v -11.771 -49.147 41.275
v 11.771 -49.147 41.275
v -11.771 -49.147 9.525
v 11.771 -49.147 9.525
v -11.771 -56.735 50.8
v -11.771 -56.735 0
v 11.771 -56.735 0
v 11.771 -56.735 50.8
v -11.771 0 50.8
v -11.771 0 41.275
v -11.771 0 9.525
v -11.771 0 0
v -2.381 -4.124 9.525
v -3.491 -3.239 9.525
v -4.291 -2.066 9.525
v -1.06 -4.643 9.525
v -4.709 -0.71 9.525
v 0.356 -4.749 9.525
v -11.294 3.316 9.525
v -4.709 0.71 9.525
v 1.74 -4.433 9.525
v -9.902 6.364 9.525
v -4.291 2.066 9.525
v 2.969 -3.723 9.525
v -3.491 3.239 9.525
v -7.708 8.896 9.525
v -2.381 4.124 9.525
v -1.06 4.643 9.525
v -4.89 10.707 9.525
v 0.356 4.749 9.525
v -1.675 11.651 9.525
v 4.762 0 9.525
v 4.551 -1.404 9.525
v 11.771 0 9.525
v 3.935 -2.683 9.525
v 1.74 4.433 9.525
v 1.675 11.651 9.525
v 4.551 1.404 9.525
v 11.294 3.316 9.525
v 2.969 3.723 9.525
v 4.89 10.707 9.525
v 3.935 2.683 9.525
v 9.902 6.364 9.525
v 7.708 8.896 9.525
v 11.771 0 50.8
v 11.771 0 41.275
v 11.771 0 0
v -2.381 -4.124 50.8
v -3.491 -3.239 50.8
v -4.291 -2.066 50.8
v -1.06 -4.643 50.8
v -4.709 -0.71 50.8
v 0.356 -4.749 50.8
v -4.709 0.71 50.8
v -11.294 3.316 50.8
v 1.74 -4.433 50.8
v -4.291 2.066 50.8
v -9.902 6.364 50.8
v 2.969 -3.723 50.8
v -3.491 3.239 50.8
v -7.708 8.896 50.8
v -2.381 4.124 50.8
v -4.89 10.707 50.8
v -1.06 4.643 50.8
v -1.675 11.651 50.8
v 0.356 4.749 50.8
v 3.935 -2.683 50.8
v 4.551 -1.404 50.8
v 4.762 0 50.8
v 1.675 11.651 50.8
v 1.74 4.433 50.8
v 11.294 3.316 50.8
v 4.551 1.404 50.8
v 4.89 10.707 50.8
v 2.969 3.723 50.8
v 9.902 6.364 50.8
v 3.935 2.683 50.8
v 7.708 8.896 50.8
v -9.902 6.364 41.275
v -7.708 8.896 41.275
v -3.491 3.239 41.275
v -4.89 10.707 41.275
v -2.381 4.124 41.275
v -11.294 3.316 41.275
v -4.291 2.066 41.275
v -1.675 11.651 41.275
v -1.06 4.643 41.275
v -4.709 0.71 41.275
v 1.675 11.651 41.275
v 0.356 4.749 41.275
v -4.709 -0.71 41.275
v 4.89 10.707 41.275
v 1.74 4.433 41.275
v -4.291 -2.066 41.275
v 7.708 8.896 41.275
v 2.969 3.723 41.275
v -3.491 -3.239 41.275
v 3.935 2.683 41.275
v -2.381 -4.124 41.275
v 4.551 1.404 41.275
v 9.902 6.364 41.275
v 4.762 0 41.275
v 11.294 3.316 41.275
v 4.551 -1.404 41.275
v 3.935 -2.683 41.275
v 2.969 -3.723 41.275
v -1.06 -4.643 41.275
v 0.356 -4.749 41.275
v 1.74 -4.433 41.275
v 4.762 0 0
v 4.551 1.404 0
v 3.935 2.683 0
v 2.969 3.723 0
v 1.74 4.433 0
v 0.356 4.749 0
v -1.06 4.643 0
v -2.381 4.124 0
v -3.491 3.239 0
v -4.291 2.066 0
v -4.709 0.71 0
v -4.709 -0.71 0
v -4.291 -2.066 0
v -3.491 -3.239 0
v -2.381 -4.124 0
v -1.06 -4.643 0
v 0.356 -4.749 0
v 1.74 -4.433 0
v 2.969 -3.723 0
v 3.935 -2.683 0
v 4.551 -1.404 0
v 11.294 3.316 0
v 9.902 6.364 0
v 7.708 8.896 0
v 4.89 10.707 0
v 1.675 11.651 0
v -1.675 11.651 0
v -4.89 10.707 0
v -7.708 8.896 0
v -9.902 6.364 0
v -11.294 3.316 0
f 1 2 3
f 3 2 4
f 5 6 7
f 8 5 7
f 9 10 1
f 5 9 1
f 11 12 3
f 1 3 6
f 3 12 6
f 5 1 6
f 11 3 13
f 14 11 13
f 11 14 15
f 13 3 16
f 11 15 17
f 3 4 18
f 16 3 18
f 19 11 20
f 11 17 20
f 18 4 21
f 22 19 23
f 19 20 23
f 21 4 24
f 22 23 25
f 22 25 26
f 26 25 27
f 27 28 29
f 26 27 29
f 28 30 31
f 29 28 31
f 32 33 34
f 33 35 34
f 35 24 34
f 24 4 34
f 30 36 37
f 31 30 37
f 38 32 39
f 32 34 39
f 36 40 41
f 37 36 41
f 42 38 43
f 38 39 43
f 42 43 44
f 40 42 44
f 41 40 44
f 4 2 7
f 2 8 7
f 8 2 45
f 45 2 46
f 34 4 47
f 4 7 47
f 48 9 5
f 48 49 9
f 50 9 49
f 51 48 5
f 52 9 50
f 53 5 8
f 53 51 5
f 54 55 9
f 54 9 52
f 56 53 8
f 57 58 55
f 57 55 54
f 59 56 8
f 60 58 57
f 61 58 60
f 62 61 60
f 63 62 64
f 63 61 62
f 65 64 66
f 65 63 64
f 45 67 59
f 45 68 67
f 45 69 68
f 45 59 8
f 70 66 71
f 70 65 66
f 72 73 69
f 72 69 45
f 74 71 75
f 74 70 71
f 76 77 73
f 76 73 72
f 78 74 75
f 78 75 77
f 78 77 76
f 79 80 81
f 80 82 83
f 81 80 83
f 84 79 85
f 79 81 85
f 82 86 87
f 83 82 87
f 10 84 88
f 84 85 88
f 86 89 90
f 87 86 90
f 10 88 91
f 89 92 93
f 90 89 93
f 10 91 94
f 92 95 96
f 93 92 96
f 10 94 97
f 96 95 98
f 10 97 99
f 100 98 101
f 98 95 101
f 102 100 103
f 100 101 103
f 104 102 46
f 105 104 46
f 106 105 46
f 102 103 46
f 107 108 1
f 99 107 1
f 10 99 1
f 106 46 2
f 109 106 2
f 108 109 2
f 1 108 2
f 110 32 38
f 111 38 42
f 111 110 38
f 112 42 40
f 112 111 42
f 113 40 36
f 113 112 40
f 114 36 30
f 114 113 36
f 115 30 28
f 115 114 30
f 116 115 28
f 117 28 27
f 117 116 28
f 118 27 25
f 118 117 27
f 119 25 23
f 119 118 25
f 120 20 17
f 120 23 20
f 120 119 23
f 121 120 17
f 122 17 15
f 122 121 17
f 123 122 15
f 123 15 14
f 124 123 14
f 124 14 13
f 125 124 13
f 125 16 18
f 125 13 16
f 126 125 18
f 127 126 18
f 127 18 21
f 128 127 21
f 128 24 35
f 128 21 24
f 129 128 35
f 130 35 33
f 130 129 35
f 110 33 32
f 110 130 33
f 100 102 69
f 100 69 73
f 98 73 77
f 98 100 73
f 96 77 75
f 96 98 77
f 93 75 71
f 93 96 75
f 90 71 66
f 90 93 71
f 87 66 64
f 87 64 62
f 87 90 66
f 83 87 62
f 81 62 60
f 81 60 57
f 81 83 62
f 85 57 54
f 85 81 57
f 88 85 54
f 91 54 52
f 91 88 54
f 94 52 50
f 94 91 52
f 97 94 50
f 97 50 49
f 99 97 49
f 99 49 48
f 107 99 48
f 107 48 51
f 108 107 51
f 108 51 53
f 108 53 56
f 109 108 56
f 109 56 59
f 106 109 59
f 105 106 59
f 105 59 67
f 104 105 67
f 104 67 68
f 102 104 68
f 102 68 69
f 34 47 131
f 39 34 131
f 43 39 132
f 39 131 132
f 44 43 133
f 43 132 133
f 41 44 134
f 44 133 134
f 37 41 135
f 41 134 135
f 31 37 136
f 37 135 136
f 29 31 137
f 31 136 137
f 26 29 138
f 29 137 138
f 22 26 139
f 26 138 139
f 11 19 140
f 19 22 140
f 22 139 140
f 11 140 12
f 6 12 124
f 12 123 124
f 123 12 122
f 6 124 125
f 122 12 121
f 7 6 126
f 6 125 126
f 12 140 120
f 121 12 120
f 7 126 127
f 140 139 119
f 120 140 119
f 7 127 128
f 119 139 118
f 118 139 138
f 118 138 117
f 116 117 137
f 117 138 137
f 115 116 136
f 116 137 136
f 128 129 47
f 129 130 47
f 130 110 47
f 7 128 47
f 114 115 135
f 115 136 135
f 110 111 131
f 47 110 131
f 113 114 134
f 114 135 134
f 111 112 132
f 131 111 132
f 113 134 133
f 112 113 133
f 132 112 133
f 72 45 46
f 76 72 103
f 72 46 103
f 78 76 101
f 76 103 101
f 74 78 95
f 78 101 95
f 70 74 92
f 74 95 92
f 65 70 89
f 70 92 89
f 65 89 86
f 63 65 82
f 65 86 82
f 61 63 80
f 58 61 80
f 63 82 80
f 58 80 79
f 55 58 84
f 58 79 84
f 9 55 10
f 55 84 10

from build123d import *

# Parameters (mm, degrees)
F0_R     = 4.7625
F1_DEPTH = 50.8
F2_W     = 18.094934
F2_H     = 31.75
F3_DEPTH = 23.542328


with BuildPart() as f1:
    # F0 (on Top) → F1 (new body)
    with BuildSketch(Plane.XY):
        with BuildLine():
            Line((-11.770664, 0), (-11.770664, -56.734564))
            Line((-11.770664, -56.734564), (11.770664, -56.734564))
            Line((11.770664, -56.734564), (11.770664, 0))
            ThreePointArc((11.770664, 0), (0, 11.770664), (-11.770664, 0))
        make_face()
        Circle(F0_R, mode=Mode.SUBTRACT)
    extrude(amount=F1_DEPTH)

    # F2 (on face) → F3 (cut, through all)
    with BuildSketch(Plane.YZ.offset(11.770664)):
        Polygon((-35.73535, 41.275), (-49.146869, 41.275), (-49.146869, 9.525), (-35.73535, 9.525), (0, 9.525), (0, 41.275), align=None)
        with Locations((9.047467, 25.4)):
            Rectangle(F2_W, F2_H)
    extrude(amount=-F3_DEPTH, mode=Mode.SUBTRACT)


solid = f1.part
